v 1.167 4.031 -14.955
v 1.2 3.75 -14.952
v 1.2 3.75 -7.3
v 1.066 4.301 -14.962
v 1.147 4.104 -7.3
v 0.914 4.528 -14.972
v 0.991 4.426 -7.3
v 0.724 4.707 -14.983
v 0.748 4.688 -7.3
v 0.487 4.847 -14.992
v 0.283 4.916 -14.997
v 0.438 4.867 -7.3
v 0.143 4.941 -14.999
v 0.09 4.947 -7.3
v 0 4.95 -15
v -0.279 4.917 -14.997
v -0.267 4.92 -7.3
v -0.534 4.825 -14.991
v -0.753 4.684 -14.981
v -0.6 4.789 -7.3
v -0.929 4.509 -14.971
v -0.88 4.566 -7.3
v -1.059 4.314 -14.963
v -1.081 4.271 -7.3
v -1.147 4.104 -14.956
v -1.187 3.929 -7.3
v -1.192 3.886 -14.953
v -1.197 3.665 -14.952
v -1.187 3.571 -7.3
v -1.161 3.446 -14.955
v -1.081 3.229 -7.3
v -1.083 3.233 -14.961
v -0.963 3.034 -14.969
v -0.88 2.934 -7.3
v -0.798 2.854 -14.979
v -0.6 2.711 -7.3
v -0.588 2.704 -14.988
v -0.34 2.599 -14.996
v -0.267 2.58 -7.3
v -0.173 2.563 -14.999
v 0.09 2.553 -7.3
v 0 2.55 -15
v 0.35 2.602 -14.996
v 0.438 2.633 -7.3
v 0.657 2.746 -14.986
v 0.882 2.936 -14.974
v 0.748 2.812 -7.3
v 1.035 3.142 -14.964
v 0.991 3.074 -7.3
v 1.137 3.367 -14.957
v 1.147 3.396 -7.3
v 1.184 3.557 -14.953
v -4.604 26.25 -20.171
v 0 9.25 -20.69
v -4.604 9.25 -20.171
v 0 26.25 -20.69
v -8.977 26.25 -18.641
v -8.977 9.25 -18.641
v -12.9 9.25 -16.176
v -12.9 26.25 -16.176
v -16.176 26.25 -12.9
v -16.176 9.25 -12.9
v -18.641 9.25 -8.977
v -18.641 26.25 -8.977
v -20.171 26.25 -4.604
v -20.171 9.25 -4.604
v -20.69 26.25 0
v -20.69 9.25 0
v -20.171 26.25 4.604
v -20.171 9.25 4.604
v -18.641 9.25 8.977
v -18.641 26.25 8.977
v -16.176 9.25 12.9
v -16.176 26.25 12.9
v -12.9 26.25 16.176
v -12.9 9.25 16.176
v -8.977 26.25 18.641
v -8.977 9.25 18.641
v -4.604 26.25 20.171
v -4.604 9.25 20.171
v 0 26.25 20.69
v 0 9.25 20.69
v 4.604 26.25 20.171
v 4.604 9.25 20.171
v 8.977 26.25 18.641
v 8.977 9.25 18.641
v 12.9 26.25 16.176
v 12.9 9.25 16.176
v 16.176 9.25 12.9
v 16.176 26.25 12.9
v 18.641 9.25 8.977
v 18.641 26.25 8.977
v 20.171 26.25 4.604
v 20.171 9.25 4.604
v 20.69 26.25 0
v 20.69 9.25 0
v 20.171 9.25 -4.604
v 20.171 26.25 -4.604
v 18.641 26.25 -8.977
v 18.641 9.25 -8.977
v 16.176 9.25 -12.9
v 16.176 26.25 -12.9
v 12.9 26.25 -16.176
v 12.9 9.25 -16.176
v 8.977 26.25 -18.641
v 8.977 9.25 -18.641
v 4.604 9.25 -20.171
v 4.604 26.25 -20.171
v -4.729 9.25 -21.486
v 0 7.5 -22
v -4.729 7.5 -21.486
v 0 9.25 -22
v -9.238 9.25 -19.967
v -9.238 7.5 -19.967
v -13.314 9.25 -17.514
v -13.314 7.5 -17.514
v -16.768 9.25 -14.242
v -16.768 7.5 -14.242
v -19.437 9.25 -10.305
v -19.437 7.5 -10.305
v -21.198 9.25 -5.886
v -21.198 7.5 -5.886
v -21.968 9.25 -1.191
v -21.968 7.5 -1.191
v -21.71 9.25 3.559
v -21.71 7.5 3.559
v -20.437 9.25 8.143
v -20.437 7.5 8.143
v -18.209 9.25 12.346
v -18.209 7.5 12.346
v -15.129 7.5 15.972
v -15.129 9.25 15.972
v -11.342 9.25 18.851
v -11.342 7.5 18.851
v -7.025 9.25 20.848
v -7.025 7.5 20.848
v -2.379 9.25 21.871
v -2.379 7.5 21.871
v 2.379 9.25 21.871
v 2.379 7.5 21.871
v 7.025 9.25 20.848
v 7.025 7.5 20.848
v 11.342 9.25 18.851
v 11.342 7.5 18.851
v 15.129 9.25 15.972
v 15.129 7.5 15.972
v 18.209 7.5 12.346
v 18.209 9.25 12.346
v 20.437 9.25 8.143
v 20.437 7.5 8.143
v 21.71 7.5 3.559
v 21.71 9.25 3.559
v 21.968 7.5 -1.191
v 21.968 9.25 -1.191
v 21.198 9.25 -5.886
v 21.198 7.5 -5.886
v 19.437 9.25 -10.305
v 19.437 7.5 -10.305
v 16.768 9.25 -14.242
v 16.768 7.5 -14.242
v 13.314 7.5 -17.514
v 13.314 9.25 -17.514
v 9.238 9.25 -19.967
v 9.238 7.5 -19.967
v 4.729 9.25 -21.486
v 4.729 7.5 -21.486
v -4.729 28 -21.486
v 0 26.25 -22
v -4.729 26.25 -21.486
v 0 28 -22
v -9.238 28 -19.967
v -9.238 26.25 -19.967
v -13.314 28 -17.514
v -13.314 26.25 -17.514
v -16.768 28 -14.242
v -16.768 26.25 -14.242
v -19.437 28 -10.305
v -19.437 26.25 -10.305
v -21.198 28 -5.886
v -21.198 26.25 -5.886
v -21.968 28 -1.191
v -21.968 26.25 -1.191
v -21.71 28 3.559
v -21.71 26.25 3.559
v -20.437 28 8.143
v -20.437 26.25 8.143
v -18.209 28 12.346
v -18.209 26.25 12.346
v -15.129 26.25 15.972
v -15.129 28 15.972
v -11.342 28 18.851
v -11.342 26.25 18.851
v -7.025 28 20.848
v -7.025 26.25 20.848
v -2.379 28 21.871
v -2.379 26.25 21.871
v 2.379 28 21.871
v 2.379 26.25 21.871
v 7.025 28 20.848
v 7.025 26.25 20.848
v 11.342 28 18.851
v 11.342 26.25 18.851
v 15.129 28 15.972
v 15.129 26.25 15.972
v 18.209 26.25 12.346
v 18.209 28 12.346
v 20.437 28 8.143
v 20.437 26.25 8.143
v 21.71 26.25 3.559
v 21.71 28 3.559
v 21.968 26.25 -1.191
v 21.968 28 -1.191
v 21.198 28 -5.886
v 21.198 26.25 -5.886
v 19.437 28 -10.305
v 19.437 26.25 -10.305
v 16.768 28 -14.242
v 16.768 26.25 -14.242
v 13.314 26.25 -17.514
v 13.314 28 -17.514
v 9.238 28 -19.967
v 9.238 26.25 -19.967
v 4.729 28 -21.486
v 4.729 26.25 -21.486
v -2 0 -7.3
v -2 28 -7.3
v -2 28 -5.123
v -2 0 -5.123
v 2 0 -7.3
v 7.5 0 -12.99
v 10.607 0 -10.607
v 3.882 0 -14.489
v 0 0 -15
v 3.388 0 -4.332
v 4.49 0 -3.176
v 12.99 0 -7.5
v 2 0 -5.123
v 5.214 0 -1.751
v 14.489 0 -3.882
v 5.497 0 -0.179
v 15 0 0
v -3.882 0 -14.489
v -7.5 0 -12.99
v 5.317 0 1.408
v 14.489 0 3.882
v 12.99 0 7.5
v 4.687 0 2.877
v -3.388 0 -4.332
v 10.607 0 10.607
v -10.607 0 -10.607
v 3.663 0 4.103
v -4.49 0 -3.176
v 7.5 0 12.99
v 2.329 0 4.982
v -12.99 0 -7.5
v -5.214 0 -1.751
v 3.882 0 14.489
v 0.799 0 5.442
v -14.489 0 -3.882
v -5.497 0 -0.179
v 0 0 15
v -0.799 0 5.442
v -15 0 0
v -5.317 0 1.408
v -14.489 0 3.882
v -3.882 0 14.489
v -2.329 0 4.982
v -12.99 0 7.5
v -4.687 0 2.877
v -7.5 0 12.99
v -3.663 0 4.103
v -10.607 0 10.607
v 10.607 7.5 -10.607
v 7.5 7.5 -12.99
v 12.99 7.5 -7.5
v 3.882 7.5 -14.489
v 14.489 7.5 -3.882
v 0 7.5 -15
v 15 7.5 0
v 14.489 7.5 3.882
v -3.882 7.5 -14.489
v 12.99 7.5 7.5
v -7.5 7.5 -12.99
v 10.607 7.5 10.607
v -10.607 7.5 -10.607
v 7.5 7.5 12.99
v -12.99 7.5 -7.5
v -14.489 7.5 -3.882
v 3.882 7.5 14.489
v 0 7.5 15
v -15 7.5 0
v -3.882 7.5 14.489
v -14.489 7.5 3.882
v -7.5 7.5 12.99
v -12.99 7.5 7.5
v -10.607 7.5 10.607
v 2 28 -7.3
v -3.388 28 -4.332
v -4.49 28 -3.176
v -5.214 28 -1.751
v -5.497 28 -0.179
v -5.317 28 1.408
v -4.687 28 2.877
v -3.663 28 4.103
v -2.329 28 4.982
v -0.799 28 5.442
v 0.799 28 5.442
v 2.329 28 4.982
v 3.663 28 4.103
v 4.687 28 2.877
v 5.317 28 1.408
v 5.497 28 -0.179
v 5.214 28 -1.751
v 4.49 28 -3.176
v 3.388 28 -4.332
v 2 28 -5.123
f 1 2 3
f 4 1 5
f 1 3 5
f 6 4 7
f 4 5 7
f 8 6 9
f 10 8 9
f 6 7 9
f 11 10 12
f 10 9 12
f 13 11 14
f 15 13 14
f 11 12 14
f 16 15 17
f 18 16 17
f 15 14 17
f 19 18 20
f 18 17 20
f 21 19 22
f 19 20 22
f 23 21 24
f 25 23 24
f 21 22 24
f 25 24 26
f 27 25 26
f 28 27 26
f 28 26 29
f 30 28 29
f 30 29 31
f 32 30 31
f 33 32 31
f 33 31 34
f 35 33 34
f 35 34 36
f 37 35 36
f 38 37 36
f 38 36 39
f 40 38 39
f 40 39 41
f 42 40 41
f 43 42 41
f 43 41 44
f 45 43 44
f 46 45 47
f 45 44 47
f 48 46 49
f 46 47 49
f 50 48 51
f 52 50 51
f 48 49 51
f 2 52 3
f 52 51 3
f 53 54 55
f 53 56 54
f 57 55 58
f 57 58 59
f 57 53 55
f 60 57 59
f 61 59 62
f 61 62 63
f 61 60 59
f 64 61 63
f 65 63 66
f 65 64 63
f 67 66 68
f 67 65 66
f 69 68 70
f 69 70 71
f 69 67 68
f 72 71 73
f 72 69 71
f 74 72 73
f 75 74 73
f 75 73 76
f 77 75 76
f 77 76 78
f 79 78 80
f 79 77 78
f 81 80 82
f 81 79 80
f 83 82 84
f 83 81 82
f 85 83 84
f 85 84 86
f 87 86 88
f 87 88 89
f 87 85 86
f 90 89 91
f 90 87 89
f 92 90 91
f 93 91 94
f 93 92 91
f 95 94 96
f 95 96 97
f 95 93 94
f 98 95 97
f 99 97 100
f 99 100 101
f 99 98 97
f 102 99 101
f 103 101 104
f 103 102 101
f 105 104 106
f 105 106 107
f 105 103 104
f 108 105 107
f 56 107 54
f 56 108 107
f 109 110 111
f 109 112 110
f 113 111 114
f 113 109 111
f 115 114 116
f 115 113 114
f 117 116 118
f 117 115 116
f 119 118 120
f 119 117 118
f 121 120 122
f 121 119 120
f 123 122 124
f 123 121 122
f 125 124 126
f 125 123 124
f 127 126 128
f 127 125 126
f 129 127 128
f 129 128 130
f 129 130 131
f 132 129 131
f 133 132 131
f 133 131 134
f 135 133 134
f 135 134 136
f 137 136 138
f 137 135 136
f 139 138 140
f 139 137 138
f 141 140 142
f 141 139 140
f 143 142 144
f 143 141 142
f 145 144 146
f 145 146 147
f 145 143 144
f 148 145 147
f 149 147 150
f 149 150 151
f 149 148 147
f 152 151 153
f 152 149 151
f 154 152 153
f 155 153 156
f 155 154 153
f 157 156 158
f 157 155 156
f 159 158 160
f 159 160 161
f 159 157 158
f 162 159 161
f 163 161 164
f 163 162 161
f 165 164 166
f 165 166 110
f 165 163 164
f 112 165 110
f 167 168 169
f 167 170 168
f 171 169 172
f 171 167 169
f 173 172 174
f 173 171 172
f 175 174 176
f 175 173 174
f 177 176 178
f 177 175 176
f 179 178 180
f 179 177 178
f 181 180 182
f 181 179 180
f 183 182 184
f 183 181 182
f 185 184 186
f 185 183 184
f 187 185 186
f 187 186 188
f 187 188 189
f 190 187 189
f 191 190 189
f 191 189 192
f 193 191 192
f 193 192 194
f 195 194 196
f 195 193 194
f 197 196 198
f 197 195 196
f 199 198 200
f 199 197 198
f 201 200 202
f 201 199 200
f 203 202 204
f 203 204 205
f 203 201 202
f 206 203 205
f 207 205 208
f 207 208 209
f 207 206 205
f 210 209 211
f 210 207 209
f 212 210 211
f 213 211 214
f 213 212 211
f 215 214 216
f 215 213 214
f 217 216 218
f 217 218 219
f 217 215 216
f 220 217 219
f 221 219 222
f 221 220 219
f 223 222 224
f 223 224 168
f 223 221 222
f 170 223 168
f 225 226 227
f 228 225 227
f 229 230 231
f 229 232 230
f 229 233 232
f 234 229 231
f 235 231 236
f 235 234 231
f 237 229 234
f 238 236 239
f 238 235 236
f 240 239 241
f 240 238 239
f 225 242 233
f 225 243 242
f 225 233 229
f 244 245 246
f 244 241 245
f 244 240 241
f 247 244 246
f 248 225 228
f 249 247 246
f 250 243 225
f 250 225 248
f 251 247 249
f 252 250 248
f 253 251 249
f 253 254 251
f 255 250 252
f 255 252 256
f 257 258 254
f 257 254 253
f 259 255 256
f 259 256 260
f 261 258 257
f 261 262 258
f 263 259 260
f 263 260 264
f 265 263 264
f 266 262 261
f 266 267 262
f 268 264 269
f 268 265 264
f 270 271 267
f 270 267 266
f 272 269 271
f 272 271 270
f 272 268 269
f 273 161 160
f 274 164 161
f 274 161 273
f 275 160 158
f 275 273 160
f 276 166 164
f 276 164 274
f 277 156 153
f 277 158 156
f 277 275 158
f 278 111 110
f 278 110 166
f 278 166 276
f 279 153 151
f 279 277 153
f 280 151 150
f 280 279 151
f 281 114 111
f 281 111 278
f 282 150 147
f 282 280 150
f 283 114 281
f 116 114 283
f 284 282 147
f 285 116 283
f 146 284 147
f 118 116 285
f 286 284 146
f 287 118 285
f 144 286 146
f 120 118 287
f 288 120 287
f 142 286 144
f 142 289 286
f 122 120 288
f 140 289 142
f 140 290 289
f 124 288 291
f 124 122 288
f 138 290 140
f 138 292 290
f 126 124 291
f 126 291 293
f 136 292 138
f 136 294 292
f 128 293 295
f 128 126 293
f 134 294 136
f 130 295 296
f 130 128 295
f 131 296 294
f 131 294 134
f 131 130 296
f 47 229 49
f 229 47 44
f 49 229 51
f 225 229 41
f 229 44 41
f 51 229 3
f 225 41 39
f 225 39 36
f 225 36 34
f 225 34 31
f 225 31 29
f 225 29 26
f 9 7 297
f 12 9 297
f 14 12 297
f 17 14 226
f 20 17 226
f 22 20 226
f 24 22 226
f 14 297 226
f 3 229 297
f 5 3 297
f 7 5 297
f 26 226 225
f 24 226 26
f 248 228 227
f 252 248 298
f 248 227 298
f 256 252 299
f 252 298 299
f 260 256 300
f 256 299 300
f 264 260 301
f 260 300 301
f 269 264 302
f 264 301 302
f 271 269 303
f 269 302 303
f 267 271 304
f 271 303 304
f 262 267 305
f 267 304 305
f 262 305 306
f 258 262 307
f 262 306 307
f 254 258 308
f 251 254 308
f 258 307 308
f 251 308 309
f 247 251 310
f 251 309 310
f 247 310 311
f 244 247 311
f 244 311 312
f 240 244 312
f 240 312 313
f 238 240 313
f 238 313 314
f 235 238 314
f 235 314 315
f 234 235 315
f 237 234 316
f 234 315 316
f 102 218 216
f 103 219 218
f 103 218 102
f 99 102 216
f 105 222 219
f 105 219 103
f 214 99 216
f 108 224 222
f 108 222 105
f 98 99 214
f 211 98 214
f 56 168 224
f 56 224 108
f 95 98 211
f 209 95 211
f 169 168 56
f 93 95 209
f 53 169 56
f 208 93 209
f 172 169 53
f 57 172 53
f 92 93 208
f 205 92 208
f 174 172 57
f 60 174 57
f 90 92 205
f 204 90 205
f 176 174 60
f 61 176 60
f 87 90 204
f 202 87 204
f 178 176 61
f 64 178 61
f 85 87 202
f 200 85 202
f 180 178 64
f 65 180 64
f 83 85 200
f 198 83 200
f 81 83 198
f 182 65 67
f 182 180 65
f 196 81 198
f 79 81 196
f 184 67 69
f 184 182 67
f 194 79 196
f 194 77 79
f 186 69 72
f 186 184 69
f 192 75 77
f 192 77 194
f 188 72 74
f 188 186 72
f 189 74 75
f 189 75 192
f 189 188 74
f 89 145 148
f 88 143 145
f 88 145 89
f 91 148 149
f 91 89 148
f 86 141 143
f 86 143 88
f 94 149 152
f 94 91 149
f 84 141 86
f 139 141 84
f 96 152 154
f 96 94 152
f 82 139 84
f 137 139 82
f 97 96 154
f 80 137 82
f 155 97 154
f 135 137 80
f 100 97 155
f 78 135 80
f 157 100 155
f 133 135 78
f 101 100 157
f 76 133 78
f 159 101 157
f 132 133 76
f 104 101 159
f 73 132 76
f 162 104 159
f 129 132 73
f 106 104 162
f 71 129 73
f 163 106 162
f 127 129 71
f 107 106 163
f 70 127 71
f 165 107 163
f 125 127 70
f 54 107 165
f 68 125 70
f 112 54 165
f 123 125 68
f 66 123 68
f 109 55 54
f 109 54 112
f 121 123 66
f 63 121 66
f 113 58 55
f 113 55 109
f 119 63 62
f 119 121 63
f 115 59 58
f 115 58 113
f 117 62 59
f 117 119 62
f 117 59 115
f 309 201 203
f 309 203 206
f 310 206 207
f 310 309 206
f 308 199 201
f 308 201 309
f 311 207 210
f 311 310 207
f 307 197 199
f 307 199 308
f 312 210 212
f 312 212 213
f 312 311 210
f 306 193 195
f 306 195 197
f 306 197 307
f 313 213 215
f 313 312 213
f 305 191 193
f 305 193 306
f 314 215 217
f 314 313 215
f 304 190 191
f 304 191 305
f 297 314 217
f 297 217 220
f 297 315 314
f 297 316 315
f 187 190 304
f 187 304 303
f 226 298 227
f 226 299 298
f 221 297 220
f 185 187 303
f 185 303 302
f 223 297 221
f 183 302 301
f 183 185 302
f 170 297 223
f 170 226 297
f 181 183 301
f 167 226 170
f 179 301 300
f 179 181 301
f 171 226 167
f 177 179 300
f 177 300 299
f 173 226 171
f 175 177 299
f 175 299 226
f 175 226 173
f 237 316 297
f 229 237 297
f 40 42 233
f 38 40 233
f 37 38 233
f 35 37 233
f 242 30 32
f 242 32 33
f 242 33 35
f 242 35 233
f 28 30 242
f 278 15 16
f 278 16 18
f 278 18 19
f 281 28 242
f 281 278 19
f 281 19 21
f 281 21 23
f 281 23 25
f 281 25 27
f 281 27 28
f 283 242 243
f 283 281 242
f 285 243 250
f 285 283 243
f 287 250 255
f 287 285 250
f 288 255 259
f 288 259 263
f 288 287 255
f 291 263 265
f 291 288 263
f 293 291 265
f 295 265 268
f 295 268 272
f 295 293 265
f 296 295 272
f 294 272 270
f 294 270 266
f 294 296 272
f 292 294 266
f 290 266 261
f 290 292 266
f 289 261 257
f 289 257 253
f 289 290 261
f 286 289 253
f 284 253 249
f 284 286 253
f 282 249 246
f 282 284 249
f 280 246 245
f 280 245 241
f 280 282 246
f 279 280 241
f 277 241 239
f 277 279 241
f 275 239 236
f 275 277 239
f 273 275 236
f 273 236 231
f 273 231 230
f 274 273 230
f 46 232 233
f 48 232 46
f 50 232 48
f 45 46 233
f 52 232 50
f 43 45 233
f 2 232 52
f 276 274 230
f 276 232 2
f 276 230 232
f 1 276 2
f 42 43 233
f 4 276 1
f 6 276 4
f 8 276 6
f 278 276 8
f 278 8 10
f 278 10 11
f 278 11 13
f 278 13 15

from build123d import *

# Parameters (mm, degrees)
SKETCH2_R          = 5.5
CUT_EXTRUDE1_DEPTH = 33
CUT_EXTRUDE2_DEPTH = 33
SKETCH4_R          = 1.2
CUT_EXTRUDE3_DEPTH = 80


with BuildPart() as part:
    # Sketch1 → Revolve1 (revolve)
    with BuildSketch(Plane.XY, mode=Mode.PRIVATE) as revolve1_sk:
        Polygon((4, 0), (15, 0), (15, 7.5), (22, 7.5), (22, 9.25), (20.69, 9.25), (20.69, 26.25), (22, 26.25), (22, 28), (4, 28), align=None)
    revolve(revolve1_sk.sketch.rotate(Axis((0, 0, 0), (0, 1, 0)), 90), axis=Axis((0, 0, 0), (0, 1, 0)))

    # Sketch2 → Cut-Extrude1 (cut)
    with BuildSketch(Plane(origin=(0, 28, 0), x_dir=(1, 0, 0), z_dir=(0, 1, 0))):
        with Locations(Location((0, 0, 0), (0, 0, 270))):
            Circle(SKETCH2_R)
    extrude(amount=-CUT_EXTRUDE1_DEPTH, mode=Mode.SUBTRACT)

    # Sketch3 → Cut-Extrude2 (cut)
    with BuildSketch(Plane(origin=(0, 28, 0), x_dir=(1, 0, 0), z_dir=(0, 1, 0))):
        with BuildLine():
            Line((-2, 7.3), (-2, 5.123475383))
            ThreePointArc((-2, 5.123475383), (0, 5.5), (2, 5.123475383))
            Line((2, 5.123475383), (2, 7.3))
            Line((2, 7.3), (-2, 7.3))
        make_face()
    extrude(amount=-CUT_EXTRUDE2_DEPTH, mode=Mode.SUBTRACT)

    # Sketch4 → Cut-Extrude3 (cut)
    with BuildSketch(Plane.XY.offset(-7.3)):
        with Locations((0, 3.75)):
            Circle(SKETCH4_R)
    extrude(amount=-CUT_EXTRUDE3_DEPTH, mode=Mode.SUBTRACT)


solid = part.part
